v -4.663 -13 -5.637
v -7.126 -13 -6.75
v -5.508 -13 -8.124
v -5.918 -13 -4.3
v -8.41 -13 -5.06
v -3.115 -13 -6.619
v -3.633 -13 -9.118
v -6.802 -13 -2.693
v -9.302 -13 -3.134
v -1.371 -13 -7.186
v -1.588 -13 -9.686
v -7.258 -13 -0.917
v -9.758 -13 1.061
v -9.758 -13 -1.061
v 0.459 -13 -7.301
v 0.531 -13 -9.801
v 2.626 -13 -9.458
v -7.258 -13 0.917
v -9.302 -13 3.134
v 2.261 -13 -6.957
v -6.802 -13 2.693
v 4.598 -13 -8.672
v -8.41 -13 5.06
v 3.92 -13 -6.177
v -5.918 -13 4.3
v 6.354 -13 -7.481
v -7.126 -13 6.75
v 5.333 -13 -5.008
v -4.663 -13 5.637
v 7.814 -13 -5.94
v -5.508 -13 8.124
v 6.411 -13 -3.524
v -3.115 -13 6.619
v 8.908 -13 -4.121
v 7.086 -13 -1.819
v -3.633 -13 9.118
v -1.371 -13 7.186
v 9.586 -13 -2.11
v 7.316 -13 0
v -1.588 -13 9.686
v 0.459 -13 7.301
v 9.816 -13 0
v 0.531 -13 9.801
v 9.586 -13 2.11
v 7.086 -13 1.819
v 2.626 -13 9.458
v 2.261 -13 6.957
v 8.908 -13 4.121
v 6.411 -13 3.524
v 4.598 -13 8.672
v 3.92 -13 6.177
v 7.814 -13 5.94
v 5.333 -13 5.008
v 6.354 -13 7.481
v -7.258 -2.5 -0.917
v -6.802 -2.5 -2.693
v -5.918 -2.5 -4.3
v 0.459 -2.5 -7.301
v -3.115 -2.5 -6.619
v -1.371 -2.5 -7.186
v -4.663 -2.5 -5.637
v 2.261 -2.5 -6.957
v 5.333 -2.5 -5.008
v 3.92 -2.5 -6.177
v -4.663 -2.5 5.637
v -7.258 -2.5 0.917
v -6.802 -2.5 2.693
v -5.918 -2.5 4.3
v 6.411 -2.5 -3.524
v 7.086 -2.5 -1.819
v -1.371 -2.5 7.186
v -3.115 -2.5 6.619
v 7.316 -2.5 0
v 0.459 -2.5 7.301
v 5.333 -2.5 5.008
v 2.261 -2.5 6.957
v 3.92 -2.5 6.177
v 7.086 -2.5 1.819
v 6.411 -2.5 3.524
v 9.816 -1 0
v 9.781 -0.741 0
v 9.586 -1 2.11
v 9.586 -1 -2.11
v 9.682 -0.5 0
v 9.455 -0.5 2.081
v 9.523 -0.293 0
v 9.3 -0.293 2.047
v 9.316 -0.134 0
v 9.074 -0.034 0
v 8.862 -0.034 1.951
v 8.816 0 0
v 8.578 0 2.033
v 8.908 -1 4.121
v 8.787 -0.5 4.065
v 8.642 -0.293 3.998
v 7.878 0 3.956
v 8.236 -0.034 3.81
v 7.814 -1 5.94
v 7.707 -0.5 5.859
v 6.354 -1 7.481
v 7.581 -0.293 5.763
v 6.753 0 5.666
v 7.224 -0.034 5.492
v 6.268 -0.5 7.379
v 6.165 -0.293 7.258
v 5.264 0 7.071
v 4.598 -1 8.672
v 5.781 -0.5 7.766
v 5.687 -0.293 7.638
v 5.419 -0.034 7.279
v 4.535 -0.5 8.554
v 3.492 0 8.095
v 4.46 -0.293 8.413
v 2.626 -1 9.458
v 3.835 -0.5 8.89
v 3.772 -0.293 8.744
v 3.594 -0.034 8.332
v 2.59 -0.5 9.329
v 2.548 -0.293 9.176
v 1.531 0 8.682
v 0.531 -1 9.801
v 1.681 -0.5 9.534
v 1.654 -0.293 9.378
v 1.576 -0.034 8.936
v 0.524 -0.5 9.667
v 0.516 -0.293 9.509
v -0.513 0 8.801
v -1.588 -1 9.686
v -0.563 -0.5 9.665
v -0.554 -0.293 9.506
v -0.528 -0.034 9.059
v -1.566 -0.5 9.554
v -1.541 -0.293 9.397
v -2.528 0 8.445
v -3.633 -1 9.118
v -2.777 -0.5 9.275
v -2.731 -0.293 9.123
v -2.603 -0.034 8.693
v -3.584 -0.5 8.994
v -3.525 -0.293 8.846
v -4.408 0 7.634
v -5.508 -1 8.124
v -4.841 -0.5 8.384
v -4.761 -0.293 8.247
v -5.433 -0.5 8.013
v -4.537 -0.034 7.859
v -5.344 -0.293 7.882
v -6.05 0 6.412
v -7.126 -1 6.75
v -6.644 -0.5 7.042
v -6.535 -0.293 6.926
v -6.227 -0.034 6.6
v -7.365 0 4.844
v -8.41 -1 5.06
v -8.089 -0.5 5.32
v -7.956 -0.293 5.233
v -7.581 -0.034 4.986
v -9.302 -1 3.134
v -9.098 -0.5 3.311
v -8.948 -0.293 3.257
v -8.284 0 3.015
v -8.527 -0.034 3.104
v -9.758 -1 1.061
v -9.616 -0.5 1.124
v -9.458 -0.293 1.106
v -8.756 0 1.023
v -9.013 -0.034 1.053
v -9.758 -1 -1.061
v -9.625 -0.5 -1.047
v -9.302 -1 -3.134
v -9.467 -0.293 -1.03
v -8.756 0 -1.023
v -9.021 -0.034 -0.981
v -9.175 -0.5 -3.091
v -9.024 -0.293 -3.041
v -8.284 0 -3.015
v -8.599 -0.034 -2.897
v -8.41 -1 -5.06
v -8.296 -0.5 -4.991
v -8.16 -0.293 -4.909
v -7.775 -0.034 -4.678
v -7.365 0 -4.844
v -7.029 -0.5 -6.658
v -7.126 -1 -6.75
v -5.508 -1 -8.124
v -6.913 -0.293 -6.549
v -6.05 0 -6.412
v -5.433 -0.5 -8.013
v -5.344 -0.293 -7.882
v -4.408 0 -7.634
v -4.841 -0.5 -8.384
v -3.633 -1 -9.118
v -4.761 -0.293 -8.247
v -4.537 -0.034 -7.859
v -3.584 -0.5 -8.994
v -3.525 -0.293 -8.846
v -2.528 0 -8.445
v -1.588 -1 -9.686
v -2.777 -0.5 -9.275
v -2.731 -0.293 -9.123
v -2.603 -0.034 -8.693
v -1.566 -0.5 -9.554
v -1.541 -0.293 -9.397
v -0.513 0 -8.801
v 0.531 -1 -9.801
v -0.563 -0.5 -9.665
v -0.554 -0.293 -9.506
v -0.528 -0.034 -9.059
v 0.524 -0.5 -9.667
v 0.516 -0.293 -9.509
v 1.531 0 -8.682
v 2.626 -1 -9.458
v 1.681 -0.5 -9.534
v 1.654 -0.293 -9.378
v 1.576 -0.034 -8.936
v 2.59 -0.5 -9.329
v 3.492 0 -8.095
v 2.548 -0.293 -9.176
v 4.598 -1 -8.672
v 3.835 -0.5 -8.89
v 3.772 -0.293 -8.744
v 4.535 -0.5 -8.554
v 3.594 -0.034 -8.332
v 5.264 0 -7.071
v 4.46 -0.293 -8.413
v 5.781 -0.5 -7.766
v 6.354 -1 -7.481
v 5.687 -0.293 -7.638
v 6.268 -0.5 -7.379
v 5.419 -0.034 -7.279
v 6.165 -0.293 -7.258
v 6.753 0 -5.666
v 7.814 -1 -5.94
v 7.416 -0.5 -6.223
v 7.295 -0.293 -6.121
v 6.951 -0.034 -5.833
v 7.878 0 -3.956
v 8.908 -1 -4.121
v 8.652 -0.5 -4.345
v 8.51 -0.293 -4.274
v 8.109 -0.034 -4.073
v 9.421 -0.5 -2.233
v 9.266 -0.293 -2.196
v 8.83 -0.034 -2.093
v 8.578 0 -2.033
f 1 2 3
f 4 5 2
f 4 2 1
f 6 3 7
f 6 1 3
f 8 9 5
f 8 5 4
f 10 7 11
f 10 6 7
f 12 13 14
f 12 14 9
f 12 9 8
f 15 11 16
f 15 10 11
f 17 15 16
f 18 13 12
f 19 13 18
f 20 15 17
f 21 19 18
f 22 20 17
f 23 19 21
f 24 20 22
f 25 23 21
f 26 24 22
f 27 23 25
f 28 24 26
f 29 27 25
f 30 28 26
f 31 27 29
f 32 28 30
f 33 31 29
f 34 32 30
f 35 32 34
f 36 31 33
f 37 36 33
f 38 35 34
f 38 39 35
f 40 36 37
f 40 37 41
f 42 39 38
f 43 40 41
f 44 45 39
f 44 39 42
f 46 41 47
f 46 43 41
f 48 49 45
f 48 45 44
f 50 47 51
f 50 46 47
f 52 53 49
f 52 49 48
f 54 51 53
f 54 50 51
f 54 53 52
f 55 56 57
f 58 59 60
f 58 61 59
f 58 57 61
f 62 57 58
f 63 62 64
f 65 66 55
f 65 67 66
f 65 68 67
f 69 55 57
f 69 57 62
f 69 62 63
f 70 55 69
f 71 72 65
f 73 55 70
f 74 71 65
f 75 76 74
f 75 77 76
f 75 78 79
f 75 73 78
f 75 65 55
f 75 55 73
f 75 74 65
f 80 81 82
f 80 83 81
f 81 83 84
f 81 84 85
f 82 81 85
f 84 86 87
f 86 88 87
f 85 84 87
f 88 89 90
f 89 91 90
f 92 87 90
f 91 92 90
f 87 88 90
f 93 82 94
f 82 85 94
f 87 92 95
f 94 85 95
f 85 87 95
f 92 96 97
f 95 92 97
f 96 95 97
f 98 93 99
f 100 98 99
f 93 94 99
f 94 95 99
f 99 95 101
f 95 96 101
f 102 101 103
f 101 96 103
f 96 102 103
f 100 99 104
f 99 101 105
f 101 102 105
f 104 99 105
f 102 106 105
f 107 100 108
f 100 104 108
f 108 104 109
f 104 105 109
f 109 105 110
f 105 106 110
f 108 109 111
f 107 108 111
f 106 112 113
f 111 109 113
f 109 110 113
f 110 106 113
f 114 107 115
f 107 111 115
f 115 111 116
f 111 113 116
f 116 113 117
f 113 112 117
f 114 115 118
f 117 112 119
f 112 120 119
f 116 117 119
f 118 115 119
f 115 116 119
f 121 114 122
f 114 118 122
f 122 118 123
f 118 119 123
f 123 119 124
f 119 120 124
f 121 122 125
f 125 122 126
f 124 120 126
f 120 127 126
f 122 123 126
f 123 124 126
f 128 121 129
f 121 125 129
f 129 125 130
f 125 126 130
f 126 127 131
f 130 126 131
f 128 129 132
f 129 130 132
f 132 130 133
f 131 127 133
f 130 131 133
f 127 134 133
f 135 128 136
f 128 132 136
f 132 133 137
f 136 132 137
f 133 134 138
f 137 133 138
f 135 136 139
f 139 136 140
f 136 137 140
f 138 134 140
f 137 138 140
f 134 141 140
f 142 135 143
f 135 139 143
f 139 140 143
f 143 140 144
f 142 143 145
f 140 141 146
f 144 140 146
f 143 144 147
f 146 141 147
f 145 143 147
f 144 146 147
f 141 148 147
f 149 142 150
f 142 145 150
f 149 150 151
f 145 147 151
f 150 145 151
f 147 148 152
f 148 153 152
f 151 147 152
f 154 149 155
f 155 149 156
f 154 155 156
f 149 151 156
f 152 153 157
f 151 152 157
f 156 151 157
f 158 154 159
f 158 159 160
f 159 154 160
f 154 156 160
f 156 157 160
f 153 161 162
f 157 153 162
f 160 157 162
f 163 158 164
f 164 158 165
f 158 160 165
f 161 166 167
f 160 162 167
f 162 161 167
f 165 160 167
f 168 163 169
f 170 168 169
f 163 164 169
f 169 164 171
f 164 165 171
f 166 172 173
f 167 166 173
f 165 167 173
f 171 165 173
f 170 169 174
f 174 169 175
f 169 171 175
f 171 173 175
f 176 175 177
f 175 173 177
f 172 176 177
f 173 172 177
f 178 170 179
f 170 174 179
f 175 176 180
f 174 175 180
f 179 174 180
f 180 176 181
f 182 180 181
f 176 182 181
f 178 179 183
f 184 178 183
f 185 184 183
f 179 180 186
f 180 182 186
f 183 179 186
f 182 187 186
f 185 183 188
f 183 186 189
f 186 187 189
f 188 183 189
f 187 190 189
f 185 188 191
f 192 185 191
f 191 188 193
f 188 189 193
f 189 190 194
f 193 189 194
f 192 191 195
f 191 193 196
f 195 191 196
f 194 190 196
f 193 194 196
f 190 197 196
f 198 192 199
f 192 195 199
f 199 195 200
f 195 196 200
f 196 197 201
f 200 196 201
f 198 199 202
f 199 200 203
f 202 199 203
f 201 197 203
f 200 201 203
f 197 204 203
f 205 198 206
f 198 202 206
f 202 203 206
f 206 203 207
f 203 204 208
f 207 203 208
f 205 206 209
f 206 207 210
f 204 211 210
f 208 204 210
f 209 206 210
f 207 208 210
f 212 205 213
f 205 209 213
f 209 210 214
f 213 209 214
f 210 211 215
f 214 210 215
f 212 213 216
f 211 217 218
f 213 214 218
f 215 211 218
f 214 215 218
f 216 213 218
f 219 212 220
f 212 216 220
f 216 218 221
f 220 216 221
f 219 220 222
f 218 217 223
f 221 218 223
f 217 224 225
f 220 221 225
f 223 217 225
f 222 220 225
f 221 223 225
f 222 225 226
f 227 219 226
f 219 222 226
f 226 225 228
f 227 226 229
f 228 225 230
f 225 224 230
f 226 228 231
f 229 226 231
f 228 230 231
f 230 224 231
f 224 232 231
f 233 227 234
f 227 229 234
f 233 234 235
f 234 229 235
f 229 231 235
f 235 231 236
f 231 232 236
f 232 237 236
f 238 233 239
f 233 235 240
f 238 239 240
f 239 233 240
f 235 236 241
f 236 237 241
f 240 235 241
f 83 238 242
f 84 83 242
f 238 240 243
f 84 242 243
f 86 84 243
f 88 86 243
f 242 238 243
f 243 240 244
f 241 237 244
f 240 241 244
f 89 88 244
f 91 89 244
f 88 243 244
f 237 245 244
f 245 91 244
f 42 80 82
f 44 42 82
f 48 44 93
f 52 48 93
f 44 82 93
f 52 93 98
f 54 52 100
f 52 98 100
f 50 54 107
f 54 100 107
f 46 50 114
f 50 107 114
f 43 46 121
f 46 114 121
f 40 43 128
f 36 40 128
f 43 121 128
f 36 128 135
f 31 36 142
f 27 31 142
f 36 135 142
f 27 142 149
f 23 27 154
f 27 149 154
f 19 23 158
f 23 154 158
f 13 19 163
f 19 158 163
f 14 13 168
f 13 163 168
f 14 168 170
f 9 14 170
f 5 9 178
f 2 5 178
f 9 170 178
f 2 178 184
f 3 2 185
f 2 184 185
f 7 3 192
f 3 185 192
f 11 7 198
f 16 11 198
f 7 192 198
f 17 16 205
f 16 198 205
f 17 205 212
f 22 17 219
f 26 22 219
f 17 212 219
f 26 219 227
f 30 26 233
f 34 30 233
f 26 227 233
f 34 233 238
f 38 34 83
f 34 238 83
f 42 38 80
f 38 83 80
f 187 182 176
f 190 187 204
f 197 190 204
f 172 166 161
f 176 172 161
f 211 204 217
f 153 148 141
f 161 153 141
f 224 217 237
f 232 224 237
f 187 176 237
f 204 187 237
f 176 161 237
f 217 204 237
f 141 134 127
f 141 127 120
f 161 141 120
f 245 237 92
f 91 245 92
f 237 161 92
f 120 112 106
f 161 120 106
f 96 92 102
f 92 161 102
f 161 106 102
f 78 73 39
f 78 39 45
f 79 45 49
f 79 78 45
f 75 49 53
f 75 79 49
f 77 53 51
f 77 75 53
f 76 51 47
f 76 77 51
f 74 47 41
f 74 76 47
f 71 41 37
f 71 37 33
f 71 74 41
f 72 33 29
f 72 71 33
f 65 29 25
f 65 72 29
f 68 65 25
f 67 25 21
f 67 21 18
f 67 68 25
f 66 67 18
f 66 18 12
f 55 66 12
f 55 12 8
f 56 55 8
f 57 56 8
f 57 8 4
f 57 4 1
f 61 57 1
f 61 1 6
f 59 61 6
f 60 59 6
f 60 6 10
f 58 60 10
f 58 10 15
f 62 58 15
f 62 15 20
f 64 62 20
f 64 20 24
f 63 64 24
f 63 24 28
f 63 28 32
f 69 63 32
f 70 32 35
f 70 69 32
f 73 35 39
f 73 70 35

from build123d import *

# Parameters (mm, degrees)
F0_R     = 9.8155
F1_DEPTH = 13
F2_R     = 1
F3_T     = -2.5


with BuildPart() as f1:
    # F0 (on Front) → F1 (new body)
    with BuildSketch(Plane.XZ):
        Circle(F0_R)
    extrude(amount=F1_DEPTH)

    # F2
    f2_edges = [f1.edges().sort_by_distance(p)[0] for p in [
        (-9.8155, 0, 0),
    ]]
    fillet(f2_edges, radius=F2_R)

    # F3
    f3_openings = [f1.faces().sort_by_distance(p)[0] for p in [
        (0, -13, 0),
    ]]
    offset(amount=F3_T, openings=f3_openings)


solid = f1.part
